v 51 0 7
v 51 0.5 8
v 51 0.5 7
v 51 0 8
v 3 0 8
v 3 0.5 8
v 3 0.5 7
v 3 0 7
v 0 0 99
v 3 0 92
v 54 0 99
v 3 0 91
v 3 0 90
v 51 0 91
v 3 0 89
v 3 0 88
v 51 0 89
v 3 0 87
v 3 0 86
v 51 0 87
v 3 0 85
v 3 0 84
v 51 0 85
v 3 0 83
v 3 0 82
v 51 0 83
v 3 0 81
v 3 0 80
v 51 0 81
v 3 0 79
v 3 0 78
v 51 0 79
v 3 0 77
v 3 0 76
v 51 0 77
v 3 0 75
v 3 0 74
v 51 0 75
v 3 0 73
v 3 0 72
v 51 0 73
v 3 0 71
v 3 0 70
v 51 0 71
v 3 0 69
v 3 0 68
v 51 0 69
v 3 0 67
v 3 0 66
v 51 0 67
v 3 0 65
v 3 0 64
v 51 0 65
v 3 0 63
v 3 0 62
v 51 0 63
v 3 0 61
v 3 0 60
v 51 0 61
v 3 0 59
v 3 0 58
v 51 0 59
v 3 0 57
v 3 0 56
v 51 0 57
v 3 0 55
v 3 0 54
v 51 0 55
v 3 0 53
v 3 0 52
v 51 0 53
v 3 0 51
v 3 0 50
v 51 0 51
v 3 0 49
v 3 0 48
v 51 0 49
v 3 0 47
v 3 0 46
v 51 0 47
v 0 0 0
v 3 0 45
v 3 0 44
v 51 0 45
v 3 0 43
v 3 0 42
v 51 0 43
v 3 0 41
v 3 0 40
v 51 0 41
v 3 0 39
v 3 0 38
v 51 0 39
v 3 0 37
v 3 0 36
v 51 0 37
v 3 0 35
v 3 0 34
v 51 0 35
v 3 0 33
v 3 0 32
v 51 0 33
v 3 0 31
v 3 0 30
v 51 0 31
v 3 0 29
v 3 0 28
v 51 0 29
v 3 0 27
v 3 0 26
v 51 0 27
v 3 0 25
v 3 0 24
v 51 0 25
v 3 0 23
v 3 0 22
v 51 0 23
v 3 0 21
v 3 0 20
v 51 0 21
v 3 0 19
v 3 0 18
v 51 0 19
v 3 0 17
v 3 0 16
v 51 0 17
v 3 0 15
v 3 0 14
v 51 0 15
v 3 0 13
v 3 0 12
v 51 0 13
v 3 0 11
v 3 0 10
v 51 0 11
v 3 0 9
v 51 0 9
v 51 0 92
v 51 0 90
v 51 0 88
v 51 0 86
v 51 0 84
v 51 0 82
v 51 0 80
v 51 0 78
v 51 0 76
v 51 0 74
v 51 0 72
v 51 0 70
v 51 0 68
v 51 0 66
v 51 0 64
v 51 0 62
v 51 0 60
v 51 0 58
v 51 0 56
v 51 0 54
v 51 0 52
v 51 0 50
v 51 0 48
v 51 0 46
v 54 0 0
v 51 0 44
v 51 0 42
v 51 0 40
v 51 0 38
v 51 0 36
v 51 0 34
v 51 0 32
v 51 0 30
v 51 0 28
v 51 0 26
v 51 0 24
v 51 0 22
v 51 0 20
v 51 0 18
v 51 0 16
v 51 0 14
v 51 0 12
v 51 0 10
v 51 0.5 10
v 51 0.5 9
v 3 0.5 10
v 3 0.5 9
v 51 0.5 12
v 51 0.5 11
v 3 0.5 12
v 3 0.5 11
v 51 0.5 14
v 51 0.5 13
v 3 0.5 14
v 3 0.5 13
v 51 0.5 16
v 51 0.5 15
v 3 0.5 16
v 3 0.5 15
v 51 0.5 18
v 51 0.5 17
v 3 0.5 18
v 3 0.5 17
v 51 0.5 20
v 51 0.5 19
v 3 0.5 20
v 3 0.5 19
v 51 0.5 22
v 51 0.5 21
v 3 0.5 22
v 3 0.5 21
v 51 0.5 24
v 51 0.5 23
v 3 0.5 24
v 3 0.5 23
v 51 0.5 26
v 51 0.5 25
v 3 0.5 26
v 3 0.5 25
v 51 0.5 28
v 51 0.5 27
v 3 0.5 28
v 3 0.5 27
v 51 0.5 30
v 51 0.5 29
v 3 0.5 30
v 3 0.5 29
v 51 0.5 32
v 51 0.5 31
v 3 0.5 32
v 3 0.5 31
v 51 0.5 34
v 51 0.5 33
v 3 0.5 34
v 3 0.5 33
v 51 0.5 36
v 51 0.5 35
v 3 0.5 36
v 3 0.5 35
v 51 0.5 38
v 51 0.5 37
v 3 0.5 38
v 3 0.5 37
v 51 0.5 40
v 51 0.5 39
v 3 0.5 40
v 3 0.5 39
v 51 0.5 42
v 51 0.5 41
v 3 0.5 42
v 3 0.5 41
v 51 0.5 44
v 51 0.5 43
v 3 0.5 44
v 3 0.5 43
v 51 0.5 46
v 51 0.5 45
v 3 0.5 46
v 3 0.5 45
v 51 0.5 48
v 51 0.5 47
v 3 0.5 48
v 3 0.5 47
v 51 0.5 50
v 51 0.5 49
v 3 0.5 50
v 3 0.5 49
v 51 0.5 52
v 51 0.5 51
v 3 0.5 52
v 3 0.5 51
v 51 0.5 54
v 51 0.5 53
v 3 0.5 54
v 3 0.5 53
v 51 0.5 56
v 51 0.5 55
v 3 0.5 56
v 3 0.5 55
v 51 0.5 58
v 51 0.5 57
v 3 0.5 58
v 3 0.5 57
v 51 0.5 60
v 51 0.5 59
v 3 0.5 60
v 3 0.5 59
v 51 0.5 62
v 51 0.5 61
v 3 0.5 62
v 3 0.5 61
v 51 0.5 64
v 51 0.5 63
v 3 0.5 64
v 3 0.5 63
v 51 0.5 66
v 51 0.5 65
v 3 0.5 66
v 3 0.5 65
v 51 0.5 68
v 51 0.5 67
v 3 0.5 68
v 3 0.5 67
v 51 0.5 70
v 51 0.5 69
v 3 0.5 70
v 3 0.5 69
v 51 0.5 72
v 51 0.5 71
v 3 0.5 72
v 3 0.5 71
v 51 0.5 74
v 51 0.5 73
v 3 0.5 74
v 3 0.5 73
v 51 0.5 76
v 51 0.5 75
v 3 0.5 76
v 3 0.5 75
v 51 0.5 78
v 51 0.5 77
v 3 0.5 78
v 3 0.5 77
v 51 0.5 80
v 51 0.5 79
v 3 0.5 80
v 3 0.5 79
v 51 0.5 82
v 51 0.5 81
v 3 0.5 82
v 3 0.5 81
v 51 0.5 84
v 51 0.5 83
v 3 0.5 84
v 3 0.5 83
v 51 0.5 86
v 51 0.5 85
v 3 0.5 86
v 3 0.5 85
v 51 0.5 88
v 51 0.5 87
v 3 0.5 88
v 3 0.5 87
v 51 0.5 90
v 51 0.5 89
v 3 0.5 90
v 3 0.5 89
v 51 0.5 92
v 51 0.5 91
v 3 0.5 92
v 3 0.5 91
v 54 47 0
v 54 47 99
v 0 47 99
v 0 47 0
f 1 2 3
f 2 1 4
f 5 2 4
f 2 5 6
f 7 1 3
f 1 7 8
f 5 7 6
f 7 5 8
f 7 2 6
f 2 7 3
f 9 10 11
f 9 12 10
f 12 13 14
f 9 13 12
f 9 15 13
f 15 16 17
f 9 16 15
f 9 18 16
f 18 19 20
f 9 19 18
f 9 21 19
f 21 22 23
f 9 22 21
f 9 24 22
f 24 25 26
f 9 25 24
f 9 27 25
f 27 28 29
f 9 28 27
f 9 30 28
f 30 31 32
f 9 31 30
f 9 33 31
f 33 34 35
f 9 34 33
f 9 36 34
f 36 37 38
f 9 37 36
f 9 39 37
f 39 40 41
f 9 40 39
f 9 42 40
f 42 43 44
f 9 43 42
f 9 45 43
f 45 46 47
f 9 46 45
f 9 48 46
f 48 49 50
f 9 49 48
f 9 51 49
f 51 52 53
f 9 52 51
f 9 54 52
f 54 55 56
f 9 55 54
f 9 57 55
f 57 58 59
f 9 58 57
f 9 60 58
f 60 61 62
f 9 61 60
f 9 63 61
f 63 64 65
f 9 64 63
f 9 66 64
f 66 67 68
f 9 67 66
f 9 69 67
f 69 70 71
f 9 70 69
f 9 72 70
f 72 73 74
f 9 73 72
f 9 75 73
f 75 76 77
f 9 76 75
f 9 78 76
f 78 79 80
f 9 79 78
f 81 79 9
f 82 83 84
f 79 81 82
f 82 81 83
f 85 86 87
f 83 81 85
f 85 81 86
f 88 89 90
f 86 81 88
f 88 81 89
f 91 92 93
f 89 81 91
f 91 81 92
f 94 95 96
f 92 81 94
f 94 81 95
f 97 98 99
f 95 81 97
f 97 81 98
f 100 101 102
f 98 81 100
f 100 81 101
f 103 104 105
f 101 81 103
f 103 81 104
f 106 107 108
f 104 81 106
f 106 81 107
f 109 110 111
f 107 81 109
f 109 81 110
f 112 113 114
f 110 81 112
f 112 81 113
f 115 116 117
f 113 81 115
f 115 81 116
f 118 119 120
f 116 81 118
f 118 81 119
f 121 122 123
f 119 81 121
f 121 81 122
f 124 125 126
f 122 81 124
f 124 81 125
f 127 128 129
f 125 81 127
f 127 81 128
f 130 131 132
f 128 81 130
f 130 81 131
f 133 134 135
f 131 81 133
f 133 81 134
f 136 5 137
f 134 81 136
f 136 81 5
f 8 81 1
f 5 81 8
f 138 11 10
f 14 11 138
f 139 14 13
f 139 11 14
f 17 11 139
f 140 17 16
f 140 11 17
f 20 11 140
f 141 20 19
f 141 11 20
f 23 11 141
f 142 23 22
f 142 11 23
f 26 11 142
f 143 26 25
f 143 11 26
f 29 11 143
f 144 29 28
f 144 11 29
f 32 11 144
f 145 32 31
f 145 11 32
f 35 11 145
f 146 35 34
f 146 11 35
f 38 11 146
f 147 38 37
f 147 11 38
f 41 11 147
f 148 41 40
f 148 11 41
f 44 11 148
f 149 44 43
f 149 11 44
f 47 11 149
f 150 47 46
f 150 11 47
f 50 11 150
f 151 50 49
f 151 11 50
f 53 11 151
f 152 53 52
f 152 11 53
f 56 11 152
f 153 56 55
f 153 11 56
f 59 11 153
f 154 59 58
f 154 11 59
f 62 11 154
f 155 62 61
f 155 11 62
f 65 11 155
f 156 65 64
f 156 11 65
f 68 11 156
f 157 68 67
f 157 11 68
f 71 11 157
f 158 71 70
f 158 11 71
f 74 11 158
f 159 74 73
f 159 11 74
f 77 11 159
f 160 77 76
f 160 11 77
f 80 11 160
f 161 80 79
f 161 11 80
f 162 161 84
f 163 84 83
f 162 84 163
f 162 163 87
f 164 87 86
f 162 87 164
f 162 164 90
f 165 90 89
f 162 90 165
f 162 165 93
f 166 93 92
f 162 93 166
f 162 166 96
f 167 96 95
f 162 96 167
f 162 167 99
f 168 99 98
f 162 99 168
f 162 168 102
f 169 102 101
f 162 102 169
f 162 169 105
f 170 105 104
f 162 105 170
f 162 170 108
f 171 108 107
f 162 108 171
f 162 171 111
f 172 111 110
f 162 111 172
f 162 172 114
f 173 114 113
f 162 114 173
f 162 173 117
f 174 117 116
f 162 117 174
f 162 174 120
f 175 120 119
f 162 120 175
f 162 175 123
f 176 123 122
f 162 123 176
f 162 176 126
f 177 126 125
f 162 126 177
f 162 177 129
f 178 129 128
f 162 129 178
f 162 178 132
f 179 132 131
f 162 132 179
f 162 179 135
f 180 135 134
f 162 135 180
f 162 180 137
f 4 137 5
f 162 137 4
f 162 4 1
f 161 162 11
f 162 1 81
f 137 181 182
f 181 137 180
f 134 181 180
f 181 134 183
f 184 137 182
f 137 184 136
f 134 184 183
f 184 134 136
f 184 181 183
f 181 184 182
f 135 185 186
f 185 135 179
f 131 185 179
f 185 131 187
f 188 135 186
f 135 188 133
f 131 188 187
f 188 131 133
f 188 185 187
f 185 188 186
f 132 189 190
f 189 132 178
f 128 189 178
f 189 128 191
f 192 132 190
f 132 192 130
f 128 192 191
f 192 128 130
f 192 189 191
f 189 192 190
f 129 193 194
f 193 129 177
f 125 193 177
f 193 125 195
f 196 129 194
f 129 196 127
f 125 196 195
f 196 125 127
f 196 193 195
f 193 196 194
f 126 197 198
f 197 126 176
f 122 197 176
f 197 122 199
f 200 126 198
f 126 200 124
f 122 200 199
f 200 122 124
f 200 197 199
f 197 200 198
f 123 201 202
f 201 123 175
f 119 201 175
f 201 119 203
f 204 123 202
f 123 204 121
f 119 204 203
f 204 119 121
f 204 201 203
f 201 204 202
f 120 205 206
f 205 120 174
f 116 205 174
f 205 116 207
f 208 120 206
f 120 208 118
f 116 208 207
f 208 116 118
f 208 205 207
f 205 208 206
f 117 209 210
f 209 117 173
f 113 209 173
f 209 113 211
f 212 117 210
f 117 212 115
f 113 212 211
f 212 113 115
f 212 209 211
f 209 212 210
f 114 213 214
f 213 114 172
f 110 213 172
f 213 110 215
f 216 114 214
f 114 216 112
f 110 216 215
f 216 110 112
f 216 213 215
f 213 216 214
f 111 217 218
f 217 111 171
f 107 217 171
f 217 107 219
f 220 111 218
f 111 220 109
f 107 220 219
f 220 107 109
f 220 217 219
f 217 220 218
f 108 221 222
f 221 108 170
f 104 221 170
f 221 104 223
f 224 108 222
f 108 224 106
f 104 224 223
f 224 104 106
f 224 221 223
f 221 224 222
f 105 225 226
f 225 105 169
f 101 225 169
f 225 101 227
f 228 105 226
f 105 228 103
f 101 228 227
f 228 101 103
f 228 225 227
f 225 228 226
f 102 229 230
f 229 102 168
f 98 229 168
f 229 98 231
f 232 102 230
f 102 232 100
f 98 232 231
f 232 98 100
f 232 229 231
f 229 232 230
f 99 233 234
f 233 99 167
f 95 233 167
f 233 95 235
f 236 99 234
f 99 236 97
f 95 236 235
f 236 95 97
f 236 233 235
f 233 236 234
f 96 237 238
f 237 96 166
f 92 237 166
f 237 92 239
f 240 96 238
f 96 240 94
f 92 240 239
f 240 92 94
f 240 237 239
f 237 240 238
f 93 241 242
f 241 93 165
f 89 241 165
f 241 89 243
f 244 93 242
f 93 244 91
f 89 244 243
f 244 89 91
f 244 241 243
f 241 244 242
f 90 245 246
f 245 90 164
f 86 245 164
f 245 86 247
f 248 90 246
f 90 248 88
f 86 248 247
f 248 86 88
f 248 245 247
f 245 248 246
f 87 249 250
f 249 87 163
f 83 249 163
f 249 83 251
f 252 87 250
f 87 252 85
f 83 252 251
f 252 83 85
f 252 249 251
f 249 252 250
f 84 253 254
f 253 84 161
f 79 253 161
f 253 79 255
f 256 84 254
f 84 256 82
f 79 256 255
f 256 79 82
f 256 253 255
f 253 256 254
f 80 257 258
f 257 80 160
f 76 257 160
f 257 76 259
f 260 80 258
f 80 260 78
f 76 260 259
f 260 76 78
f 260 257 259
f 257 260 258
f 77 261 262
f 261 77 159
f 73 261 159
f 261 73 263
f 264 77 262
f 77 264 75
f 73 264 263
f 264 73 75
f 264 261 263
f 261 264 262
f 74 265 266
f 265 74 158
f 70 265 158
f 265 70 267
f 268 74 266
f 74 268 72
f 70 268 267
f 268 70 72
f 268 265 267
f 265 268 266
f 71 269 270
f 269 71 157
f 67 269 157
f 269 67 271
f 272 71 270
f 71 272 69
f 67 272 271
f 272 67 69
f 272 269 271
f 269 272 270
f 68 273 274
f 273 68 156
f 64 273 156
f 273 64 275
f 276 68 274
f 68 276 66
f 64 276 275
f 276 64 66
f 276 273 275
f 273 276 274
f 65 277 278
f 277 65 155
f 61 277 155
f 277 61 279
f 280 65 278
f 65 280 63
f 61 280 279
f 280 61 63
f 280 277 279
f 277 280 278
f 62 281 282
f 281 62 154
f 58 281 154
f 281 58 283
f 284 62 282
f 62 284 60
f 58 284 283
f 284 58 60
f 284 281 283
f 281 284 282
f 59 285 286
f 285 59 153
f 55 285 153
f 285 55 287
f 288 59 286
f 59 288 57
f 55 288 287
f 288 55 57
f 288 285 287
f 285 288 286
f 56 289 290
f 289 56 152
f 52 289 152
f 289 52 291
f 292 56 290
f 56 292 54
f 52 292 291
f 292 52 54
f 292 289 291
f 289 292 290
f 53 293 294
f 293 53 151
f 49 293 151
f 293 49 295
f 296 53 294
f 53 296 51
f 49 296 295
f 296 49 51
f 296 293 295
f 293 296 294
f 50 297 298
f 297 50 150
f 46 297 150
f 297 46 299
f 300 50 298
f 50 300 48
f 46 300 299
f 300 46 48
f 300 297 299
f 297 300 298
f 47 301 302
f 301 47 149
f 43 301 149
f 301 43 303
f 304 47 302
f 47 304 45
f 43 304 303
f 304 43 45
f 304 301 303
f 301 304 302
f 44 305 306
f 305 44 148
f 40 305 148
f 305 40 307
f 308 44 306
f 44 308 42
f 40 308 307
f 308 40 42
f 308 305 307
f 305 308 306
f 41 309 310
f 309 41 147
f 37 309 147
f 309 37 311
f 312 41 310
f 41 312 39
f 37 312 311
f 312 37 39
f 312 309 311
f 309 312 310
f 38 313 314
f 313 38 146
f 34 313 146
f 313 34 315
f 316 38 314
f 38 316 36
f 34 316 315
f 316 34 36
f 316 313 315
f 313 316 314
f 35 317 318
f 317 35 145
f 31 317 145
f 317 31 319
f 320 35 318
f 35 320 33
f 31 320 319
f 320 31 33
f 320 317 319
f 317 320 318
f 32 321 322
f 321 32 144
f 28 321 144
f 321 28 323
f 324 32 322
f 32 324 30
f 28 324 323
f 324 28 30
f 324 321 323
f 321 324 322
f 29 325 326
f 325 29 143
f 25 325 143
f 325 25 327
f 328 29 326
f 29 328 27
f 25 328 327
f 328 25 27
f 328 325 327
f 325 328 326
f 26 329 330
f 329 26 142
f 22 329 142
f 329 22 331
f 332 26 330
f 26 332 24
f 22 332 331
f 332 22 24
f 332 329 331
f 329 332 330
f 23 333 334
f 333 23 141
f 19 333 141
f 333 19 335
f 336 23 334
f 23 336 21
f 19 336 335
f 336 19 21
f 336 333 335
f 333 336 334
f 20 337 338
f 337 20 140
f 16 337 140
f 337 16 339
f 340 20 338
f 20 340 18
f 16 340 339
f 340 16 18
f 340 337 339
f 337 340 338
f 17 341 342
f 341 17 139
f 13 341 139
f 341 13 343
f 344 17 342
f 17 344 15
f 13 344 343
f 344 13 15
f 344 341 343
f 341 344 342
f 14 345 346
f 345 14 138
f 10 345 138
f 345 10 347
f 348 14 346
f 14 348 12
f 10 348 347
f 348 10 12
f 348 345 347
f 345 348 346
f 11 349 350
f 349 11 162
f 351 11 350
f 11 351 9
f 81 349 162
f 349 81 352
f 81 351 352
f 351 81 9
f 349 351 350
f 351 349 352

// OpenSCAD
width = 54;
depth = 47;
height = 99;

difference() {
  cube([width, depth, height]);

  values = [7:2:92];
  for(v = values) {
    translate([3, 0, v])
      cube([48, 0.5, 1]);
  }
}
